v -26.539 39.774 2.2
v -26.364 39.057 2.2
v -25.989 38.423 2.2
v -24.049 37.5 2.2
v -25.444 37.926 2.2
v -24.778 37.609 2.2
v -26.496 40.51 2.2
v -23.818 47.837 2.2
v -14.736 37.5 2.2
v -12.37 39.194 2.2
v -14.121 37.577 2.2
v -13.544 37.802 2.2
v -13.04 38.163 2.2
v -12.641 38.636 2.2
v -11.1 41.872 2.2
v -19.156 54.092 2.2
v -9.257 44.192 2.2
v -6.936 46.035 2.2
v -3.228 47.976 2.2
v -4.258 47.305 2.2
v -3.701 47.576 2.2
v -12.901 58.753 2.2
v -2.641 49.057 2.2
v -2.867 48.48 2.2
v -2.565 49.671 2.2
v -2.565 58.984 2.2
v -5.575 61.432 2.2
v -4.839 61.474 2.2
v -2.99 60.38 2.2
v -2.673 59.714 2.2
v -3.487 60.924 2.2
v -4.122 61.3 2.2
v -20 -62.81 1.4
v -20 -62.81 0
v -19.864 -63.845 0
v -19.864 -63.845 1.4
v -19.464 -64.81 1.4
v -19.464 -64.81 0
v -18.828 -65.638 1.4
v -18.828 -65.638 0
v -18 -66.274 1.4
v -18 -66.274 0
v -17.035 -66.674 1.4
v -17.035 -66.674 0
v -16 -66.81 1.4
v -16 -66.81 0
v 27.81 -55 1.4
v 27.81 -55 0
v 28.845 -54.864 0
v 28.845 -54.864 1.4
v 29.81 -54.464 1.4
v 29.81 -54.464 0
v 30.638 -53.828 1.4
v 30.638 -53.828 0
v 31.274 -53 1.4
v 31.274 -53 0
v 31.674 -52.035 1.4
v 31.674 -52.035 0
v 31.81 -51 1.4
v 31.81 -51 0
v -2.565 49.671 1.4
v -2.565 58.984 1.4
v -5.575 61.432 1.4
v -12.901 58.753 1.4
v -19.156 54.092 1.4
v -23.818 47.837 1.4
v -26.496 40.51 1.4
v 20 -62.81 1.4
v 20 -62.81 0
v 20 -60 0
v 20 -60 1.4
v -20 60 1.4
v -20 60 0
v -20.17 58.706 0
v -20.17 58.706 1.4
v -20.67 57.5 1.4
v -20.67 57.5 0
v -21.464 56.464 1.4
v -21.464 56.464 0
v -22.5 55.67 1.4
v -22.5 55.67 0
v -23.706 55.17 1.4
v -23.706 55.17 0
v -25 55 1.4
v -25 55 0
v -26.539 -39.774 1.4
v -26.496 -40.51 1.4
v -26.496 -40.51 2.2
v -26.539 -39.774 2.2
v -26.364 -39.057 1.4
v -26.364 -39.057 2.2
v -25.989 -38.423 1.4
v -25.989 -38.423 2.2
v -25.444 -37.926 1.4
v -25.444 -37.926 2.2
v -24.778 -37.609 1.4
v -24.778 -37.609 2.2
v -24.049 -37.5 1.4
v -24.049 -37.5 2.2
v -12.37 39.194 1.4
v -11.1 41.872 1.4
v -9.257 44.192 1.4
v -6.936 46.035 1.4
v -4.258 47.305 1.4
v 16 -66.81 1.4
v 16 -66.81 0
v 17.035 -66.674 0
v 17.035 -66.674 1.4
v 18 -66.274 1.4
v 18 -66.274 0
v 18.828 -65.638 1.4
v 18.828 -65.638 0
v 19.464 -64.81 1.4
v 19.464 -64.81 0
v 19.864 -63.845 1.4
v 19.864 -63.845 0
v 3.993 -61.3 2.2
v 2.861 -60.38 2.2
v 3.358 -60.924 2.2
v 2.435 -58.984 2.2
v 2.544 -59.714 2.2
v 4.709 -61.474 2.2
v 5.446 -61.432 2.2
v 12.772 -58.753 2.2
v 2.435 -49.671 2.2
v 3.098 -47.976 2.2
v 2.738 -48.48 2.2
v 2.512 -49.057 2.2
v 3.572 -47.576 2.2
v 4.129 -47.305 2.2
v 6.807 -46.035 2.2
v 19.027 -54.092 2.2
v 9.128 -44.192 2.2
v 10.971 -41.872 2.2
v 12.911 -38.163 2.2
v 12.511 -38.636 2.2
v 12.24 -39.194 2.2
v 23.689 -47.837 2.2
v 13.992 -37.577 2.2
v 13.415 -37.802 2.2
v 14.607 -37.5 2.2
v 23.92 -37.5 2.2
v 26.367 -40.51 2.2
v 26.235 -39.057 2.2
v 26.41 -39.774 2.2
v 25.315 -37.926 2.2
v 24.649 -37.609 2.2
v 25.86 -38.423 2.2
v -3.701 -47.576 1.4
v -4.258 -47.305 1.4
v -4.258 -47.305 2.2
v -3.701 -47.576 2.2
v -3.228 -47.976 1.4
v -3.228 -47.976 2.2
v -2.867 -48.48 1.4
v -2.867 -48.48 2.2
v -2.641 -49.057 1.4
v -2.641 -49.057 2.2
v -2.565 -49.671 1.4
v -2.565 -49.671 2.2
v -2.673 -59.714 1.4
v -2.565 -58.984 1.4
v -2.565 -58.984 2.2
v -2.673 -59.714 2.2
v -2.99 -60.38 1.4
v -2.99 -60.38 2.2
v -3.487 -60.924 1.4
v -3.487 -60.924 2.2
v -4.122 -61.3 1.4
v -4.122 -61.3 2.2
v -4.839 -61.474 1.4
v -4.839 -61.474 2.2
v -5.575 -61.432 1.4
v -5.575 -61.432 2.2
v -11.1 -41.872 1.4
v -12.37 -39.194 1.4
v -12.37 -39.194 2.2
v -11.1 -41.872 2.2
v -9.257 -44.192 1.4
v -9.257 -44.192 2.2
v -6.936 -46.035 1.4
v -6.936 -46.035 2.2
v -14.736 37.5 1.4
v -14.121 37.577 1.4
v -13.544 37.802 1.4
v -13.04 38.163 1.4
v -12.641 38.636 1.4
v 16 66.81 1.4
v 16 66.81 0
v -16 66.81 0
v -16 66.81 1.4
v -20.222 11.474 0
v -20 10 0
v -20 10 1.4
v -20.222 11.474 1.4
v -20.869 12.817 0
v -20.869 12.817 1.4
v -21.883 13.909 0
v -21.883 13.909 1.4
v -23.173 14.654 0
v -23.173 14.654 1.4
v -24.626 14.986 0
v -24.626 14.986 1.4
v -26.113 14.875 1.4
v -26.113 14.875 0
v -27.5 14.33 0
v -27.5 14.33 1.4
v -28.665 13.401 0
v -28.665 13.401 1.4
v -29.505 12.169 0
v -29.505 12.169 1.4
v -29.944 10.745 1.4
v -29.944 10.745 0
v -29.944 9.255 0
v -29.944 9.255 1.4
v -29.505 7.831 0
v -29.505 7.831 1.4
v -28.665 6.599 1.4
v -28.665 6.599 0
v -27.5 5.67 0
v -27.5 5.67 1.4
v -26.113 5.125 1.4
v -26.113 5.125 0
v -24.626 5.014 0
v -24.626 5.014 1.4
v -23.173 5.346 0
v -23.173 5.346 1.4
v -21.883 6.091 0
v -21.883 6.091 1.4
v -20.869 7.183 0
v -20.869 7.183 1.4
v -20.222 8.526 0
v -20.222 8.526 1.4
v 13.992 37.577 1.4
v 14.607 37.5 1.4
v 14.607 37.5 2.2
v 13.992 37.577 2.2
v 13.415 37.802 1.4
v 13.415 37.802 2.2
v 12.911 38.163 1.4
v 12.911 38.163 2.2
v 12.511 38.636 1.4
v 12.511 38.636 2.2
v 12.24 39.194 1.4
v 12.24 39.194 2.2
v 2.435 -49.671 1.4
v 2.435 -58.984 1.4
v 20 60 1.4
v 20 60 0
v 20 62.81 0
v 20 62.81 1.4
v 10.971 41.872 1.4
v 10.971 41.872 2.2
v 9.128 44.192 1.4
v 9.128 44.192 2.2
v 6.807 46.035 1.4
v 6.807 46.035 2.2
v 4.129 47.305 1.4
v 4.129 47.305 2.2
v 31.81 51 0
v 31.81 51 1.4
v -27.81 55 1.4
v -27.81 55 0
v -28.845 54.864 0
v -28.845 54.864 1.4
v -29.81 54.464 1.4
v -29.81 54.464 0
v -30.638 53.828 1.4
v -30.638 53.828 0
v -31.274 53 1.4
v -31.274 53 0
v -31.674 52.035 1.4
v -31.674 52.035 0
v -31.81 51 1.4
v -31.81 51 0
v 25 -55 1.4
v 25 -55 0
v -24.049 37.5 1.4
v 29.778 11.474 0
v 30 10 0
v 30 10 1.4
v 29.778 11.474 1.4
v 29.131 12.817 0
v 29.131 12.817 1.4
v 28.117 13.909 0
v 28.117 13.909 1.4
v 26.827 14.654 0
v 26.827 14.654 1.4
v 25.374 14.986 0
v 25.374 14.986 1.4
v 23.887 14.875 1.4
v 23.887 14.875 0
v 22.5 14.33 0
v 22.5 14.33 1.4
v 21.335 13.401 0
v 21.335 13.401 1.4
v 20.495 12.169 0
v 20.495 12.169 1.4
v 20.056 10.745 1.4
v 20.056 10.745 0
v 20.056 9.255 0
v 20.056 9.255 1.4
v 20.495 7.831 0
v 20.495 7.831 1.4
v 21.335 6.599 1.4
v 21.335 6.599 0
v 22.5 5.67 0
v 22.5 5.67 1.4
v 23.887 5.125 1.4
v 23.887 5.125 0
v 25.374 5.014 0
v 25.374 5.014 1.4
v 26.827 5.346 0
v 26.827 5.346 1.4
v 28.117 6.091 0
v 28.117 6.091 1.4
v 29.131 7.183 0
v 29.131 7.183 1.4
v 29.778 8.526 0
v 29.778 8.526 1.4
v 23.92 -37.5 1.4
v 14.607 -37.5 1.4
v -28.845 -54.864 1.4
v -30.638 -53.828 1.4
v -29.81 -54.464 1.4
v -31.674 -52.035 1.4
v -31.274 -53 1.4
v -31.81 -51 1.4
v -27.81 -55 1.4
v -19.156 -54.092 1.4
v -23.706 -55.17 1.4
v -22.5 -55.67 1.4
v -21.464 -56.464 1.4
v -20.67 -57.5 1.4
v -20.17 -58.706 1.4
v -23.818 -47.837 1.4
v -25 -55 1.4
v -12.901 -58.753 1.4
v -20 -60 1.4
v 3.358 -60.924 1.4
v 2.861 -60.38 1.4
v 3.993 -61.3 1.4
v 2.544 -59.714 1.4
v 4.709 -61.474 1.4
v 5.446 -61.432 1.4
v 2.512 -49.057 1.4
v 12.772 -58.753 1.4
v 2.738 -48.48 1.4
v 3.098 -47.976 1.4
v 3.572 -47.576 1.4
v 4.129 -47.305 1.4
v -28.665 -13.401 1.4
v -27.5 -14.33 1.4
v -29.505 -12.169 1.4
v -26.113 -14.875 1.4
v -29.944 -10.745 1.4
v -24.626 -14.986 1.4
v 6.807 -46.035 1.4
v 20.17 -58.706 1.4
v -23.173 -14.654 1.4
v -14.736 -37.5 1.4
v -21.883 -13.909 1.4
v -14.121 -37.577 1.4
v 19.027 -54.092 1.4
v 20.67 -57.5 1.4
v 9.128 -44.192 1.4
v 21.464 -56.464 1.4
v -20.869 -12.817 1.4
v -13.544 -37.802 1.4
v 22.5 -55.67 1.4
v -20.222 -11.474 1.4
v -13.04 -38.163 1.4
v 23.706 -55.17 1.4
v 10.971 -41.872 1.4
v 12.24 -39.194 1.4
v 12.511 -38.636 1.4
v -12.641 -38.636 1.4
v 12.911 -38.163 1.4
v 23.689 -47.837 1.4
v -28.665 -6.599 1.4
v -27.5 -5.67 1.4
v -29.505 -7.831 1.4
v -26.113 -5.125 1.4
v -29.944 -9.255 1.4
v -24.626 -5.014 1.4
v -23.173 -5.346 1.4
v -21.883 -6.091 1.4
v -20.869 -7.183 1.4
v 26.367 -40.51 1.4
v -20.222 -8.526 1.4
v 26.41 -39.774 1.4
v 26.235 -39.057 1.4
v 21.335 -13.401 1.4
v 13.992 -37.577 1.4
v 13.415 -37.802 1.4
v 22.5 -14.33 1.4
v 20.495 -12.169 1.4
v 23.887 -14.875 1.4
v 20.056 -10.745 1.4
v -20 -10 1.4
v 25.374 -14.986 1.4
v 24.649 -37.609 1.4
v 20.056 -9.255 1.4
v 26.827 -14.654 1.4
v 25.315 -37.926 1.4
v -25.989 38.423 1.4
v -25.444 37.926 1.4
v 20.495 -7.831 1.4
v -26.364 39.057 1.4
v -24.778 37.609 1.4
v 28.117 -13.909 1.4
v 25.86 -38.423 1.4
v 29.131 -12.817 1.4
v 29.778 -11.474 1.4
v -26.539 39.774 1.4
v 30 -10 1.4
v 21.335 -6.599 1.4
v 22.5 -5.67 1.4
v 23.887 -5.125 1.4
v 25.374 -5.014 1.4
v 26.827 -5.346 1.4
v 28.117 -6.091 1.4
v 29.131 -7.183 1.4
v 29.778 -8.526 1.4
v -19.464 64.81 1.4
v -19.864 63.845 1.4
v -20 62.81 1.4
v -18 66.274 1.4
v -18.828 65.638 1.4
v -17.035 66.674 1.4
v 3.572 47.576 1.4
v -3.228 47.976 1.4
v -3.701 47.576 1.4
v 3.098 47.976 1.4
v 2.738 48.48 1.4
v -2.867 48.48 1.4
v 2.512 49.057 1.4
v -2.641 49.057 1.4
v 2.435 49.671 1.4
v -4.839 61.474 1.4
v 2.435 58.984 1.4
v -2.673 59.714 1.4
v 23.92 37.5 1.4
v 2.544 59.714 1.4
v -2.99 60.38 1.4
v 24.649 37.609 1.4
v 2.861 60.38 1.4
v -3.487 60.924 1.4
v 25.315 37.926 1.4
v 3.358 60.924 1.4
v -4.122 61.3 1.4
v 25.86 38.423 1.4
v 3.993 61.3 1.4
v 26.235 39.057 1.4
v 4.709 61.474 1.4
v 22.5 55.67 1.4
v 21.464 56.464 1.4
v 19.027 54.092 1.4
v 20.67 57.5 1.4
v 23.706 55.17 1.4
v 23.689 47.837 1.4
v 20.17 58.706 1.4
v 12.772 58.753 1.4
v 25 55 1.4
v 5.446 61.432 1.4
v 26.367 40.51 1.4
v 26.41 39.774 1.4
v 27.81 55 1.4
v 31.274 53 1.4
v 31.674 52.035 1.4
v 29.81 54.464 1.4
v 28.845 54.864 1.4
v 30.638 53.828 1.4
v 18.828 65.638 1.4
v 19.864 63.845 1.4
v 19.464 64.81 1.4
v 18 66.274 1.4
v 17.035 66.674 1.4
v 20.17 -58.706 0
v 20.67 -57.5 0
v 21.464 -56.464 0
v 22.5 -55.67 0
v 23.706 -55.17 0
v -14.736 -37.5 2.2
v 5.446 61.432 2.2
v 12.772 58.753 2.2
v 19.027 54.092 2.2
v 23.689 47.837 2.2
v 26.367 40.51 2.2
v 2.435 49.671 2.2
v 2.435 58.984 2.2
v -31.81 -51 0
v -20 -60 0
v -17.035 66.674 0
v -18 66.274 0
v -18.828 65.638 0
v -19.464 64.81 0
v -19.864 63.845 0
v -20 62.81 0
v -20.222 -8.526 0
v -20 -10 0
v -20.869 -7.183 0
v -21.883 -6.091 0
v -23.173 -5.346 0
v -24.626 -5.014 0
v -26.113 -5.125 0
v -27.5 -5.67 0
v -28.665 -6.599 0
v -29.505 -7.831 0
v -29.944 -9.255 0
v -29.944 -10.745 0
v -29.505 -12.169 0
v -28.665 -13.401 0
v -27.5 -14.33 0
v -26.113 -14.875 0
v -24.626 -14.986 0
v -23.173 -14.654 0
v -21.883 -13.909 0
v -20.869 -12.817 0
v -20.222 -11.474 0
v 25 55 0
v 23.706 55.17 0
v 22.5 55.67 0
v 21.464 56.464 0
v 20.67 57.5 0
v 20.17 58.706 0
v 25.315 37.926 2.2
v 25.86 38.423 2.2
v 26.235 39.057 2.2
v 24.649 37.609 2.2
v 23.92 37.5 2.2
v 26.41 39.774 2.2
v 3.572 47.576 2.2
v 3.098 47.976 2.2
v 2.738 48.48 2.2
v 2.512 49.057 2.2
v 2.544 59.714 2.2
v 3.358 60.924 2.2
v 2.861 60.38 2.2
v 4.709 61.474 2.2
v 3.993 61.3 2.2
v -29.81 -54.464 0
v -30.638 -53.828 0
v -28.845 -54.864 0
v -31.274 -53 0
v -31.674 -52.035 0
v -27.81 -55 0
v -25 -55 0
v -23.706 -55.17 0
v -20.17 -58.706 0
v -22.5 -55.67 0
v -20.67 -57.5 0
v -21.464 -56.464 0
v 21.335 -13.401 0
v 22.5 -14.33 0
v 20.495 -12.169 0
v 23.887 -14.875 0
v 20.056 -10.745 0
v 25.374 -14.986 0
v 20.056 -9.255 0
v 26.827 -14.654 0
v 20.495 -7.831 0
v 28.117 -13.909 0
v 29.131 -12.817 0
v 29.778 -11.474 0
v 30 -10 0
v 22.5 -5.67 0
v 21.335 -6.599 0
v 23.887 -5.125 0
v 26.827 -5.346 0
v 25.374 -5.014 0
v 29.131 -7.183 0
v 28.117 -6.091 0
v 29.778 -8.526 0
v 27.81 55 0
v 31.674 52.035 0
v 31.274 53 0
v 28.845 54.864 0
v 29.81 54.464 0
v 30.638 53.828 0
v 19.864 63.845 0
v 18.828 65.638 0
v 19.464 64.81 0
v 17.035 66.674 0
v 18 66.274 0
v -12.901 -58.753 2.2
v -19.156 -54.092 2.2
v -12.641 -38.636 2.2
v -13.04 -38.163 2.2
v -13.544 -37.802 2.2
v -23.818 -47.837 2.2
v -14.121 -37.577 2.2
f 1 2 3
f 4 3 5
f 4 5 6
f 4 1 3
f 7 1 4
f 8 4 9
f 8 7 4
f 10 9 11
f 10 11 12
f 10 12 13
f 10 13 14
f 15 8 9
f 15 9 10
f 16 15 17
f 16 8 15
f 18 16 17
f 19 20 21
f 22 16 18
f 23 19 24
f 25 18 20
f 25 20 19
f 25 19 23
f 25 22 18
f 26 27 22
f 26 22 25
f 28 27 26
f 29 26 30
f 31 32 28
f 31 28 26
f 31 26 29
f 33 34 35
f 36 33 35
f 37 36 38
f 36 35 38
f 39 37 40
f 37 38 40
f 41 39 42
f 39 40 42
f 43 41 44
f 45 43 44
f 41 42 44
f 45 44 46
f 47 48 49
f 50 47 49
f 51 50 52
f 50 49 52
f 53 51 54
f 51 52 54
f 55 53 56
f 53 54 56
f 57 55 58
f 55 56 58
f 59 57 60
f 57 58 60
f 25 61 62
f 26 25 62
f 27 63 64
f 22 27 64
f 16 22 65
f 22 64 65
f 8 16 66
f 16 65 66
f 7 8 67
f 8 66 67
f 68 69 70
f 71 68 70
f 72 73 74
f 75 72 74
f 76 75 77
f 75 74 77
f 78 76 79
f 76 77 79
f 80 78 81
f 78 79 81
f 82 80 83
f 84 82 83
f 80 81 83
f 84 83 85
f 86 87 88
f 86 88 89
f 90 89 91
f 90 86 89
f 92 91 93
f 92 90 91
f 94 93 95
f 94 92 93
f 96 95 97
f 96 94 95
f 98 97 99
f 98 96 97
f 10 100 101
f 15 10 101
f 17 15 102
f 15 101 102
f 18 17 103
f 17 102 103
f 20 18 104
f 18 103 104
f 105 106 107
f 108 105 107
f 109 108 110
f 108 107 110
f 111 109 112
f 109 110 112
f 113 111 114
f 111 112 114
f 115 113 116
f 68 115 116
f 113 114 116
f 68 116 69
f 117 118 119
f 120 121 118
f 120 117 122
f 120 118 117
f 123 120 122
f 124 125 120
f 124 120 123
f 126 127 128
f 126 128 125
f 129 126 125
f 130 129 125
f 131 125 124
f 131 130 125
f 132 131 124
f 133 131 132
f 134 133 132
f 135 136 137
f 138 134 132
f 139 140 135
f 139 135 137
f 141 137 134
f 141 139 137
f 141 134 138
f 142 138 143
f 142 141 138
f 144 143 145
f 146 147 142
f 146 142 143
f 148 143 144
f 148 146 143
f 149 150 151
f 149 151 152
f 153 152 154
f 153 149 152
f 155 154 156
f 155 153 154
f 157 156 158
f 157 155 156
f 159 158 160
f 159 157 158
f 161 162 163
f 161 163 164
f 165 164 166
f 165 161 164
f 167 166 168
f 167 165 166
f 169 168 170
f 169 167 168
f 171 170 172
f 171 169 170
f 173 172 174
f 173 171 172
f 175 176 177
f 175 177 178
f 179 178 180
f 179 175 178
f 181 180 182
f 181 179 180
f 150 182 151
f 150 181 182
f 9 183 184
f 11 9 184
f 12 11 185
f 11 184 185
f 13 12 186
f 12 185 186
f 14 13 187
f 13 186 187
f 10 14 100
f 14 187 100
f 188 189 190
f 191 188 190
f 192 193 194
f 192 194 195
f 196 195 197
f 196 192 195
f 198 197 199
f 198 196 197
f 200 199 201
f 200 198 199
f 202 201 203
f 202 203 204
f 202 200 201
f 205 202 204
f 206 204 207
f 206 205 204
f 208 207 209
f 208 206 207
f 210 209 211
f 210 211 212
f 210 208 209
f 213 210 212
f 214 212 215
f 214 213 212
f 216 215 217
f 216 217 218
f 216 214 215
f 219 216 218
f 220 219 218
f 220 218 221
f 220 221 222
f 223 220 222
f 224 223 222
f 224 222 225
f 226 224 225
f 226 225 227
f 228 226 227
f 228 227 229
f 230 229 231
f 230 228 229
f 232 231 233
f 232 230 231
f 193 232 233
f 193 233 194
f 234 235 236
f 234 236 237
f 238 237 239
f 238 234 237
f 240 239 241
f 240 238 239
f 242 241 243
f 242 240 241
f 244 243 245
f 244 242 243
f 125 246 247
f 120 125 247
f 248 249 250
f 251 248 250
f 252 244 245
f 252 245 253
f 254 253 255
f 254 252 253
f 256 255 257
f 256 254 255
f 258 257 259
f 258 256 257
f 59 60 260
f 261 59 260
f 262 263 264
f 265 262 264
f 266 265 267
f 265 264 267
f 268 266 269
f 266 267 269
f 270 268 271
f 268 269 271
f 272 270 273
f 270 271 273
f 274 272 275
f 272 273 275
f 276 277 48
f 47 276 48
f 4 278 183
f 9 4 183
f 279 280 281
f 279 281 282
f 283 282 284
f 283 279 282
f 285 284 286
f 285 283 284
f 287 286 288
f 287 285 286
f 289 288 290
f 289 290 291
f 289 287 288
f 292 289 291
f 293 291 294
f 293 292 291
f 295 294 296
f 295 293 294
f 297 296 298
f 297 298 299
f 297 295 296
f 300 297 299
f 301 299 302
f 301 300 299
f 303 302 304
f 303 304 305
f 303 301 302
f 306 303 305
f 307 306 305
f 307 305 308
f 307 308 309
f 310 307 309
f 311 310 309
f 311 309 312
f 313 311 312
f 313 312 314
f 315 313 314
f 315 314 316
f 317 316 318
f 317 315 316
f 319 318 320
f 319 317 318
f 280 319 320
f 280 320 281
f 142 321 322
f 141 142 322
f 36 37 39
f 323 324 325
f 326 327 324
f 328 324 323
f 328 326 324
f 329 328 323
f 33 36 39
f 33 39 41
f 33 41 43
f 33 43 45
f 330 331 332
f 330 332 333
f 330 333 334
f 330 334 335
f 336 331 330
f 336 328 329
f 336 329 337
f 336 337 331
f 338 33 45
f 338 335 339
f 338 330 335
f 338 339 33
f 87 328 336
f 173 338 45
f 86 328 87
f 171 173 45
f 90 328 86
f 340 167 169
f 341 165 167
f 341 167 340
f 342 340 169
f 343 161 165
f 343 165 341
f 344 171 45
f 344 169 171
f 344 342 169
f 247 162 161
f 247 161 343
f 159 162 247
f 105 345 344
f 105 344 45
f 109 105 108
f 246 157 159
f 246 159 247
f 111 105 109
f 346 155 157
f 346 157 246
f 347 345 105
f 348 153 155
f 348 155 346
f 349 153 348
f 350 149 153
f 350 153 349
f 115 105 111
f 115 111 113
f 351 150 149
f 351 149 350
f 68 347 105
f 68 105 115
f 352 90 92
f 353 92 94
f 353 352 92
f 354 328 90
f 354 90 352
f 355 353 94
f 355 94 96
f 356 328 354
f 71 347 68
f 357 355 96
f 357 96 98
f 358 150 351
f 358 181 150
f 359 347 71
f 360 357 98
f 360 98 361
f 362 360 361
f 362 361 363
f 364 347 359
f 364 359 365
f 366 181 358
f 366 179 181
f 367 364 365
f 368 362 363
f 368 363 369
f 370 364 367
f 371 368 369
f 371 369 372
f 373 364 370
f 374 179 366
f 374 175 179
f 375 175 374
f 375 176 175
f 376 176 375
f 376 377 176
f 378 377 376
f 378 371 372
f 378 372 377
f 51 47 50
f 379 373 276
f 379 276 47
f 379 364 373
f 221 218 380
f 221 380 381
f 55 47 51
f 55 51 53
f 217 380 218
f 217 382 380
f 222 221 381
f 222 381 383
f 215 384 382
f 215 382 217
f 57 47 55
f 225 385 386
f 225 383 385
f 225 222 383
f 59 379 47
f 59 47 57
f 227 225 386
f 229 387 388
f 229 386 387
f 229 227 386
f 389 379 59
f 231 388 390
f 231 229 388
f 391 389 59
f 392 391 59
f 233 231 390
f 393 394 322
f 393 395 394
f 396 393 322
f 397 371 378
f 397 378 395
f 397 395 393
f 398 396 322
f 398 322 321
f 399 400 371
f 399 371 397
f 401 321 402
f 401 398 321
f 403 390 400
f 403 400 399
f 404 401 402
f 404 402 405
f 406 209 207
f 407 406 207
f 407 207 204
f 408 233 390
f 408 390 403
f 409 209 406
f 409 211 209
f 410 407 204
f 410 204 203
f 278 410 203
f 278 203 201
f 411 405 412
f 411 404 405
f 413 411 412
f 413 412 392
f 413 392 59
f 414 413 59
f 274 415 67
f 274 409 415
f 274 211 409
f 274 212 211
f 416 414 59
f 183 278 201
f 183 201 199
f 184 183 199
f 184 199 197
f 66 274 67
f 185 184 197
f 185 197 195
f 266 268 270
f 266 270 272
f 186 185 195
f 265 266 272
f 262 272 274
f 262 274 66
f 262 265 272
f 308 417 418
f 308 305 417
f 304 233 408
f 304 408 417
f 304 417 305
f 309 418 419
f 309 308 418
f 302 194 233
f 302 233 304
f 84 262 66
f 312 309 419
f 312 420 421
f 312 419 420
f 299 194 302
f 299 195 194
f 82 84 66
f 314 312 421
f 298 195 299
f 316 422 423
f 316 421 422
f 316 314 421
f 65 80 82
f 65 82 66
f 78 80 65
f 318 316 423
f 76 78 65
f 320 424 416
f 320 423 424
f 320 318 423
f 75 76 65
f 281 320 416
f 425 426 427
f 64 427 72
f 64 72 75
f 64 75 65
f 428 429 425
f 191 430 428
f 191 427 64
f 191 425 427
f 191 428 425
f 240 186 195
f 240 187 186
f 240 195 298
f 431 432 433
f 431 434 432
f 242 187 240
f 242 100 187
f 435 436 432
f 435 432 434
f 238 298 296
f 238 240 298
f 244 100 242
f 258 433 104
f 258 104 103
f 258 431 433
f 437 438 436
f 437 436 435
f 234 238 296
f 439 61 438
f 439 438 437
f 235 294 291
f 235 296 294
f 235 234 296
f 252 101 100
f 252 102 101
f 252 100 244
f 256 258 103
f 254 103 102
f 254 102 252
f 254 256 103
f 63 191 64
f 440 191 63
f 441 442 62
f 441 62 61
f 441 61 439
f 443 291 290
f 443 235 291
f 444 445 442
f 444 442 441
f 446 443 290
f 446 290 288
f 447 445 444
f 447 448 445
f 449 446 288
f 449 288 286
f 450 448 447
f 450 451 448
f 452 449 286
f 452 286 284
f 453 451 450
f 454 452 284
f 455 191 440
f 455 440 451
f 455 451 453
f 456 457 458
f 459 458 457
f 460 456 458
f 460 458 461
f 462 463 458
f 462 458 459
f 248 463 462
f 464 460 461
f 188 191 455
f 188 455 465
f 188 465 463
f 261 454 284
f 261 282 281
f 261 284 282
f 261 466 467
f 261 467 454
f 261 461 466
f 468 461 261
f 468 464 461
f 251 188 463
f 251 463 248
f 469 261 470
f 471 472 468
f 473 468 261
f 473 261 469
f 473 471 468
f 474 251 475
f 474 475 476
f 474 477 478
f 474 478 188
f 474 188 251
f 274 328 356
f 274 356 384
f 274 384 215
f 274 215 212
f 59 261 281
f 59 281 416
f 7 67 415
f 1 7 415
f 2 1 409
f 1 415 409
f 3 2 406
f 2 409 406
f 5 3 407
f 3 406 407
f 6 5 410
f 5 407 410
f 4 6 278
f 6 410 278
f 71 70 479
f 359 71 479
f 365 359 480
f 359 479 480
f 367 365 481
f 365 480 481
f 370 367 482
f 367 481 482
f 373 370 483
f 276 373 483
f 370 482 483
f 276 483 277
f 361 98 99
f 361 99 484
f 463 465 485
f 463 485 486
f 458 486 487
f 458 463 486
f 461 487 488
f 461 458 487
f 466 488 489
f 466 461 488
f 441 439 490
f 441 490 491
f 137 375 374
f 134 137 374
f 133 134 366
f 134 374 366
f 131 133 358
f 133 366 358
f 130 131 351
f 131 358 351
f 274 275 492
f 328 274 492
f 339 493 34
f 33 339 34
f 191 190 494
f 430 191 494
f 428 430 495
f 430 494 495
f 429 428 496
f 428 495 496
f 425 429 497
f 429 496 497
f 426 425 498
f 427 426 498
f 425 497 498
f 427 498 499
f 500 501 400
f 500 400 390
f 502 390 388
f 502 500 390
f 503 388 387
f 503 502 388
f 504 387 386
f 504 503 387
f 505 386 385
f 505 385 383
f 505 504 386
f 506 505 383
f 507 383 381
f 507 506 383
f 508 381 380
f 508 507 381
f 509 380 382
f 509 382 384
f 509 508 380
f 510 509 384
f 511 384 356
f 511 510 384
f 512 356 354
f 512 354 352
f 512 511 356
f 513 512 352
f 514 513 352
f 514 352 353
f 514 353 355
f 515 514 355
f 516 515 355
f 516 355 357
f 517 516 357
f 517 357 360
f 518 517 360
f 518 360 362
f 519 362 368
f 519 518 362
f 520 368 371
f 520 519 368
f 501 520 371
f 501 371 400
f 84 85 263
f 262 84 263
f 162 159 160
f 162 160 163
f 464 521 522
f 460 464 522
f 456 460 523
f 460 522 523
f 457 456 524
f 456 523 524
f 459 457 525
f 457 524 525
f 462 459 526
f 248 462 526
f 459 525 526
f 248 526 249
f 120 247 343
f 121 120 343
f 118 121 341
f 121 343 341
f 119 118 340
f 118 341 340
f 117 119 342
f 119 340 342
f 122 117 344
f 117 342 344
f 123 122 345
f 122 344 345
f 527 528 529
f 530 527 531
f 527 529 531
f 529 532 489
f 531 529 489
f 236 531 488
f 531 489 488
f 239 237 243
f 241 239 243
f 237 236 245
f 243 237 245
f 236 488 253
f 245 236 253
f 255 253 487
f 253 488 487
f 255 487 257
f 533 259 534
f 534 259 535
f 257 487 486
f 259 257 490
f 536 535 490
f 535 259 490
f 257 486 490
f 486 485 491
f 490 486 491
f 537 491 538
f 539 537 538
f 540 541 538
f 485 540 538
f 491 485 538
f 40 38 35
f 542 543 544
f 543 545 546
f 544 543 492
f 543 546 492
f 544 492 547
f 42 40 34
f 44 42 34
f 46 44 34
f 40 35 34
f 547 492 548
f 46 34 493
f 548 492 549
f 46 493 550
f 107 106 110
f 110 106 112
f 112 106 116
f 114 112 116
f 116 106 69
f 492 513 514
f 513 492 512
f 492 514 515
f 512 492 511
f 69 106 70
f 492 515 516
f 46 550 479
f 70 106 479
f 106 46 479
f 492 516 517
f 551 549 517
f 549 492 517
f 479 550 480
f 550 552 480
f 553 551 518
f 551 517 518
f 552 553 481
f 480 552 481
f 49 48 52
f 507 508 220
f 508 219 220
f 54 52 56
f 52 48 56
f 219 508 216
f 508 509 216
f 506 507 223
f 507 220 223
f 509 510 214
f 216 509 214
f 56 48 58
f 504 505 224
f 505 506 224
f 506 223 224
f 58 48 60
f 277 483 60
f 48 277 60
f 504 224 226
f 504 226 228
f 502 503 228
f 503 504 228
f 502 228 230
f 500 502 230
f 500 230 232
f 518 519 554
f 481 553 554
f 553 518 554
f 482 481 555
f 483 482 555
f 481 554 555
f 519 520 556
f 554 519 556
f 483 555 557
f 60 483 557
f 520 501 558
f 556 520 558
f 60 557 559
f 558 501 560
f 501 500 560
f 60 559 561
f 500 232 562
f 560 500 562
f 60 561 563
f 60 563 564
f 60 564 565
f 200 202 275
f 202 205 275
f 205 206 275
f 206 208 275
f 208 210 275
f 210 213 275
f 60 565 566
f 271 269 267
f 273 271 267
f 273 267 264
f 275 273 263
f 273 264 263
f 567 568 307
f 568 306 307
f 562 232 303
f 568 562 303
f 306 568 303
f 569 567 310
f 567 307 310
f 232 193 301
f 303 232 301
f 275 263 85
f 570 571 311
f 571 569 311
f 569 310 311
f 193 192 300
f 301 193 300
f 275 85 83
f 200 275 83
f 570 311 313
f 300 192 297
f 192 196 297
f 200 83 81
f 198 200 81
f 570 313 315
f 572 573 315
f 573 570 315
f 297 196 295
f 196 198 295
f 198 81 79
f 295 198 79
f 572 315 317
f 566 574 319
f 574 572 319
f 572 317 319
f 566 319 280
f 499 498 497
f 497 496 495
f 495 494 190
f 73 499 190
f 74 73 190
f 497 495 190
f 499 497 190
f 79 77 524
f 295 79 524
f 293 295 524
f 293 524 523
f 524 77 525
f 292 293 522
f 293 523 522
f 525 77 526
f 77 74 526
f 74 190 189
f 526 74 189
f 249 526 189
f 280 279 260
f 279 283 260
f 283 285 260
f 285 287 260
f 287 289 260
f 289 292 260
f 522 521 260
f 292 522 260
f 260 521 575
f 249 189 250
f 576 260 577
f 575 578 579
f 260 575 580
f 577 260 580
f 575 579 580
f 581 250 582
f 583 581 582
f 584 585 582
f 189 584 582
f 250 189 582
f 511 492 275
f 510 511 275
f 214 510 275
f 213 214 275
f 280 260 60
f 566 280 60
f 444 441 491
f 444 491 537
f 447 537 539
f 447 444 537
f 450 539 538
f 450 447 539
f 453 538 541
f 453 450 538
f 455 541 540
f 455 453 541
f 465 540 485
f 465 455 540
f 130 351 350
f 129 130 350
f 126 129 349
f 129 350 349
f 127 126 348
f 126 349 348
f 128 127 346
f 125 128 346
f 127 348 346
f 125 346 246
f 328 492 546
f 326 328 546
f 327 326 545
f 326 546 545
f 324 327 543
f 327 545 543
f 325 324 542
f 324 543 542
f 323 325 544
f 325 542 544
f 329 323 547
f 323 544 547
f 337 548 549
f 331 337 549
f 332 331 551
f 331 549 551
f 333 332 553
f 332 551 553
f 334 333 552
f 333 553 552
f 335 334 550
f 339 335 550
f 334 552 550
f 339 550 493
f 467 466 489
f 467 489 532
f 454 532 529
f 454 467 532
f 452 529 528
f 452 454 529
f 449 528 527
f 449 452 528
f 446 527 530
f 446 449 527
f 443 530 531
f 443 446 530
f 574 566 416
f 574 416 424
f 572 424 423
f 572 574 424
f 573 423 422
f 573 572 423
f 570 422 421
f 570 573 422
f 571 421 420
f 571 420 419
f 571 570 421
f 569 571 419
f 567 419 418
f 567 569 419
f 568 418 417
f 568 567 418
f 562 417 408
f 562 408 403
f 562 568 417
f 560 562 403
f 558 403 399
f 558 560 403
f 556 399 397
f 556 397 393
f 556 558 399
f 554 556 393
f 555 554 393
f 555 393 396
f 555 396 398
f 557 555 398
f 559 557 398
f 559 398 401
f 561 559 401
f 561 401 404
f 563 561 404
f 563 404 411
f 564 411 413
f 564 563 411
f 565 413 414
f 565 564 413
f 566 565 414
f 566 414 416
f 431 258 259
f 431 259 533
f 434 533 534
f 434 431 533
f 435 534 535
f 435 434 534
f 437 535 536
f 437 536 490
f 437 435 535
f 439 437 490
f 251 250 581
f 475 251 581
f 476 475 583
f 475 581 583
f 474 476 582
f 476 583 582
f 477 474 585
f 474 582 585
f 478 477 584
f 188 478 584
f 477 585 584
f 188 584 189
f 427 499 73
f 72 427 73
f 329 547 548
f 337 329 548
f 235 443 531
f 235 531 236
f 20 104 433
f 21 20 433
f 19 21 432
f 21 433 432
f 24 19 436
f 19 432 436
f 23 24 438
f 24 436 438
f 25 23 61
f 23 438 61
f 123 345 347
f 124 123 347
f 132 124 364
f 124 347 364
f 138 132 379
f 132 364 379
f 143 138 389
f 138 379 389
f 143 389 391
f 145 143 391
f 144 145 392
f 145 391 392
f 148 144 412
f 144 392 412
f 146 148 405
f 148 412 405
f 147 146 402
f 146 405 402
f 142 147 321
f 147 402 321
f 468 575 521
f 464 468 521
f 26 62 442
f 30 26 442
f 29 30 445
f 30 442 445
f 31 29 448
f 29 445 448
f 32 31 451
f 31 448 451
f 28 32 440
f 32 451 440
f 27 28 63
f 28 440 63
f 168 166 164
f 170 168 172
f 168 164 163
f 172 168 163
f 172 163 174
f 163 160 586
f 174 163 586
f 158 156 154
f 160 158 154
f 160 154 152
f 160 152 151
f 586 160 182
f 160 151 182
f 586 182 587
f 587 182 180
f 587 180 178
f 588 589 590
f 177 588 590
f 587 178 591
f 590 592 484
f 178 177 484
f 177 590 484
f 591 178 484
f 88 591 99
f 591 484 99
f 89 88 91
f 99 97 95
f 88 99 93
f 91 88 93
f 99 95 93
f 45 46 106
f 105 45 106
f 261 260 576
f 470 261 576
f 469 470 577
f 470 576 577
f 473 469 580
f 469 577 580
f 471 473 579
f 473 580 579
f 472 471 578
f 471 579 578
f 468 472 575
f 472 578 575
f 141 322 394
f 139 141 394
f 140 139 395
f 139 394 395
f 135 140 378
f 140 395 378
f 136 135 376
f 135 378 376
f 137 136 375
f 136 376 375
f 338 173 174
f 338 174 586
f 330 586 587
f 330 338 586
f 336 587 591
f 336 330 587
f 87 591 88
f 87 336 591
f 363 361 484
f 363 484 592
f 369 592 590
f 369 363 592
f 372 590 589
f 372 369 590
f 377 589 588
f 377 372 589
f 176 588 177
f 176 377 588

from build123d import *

# Parameters (mm, degrees)
SKETCH1_R           = 5
BOSS_EXTRUDE1_DEPTH = 1.4
BOSS_EXTRUDE2_DEPTH = 0.8


with BuildPart() as part:
    # Sketch1 → Boss-Extrude1 (new body)
    with BuildSketch(Plane.XY):
        with BuildLine():
            Line((20, 60), (20, 62.81))
            ThreePointArc((20, 62.81), (18.828427125, 65.638427125), (16, 66.81))
            Line((16, 66.81), (-16, 66.81))
            ThreePointArc((-16, 66.81), (-18.828427125, 65.638427125), (-20, 62.81))
            Line((-20, 62.81), (-20, 60))
            ThreePointArc((-20, 60), (-21.464466094, 56.464466094), (-25, 55))
            Line((-25, 55), (-27.81, 55))
            ThreePointArc((-27.81, 55), (-30.638427125, 53.828427125), (-31.81, 51))
            Line((-31.81, 51), (-31.81, -51))
            ThreePointArc((-31.81, -51), (-30.638427125, -53.828427125), (-27.81, -55))
            Line((-27.81, -55), (-25, -55))
            ThreePointArc((-25, -55), (-21.464466094, -56.464466094), (-20, -60))
            Line((-20, -60), (-20, -62.81))
            ThreePointArc((-20, -62.81), (-18.828427125, -65.638427125), (-16, -66.81))
            Line((-16, -66.81), (16, -66.81))
            ThreePointArc((16, -66.81), (18.828427125, -65.638427125), (20, -62.81))
            Line((20, -62.81), (20, -60))
            ThreePointArc((20, -60), (21.464466094, -56.464466094), (25, -55))
            Line((25, -55), (27.81, -55))
            ThreePointArc((27.81, -55), (30.638427125, -53.828427125), (31.81, -51))
            Line((31.81, -51), (31.81, 51))
            ThreePointArc((31.81, 51), (30.638427125, 53.828427125), (27.81, 55))
            Line((27.81, 55), (25, 55))
            ThreePointArc((25, 55), (21.464466094, 56.464466094), (20, 60))
        make_face()
        with Locations((-25, 10)):
            Circle(SKETCH1_R, mode=Mode.SUBTRACT)
        with Locations((25, 10)):
            Circle(SKETCH1_R, mode=Mode.SUBTRACT)
        with Locations((-25, -10)):
            Circle(SKETCH1_R, mode=Mode.SUBTRACT)
        with Locations((25, -10)):
            Circle(SKETCH1_R, mode=Mode.SUBTRACT)
    extrude(amount=BOSS_EXTRUDE1_DEPTH)

    # Sketch2 → Boss-Extrude2 (add)
    with BuildSketch(Plane.XY.offset(1.4)):
        with BuildLine():
            Line((-24.048951294, 37.5), (-14.735982135, 37.5))
            ThreePointArc((-14.735982135, 37.5), (-13.281012897, 37.967006022), (-12.369627175, 39.193548387))
            ThreePointArc((-12.369627175, 39.193548387), (-9.256969539, 44.192388155), (-4.258129771, 47.305045791))
            ThreePointArc((-4.258129771, 47.305045791), (-3.031587405, 48.216431513), (-2.564581384, 49.671400751))
            Line((-2.564581384, 49.671400751), (-2.564581384, 58.98436991))
            ThreePointArc((-2.564581384, 58.98436991), (-3.487481229, 60.924152141), (-5.574785465, 61.431754595))
            ThreePointArc((-5.574785465, 61.431754595), (-19.156464476, 54.091883092), (-26.496335979, 40.510204082))
            ThreePointArc((-26.496335979, 40.510204082), (-25.988733525, 38.422899845), (-24.048951294, 37.5))
        make_face()
        with BuildLine():
            Line((23.919788527, 37.5), (14.606819368, 37.5))
            ThreePointArc((14.606819368, 37.5), (13.151850129, 37.967006022), (12.240464408, 39.193548387))
            ThreePointArc((12.240464408, 39.193548387), (9.127806772, 44.192388155), (4.128967004, 47.305045791))
            ThreePointArc((4.128967004, 47.305045791), (2.902424638, 48.216431513), (2.435418616, 49.671400751))
            Line((2.435418616, 49.671400751), (2.435418616, 58.98436991))
            ThreePointArc((2.435418616, 58.98436991), (3.358318462, 60.924152141), (5.445622698, 61.431754595))
            ThreePointArc((5.445622698, 61.431754595), (19.027301709, 54.091883092), (26.367173212, 40.510204082))
            ThreePointArc((26.367173212, 40.510204082), (25.859570757, 38.422899845), (23.919788527, 37.5))
        make_face()
        with BuildLine():
            Line((-24.048951294, -37.5), (-14.735982135, -37.5))
            ThreePointArc((-14.735982135, -37.5), (-13.281012897, -37.967006022), (-12.369627175, -39.193548387))
            ThreePointArc((-12.369627175, -39.193548387), (-9.256969539, -44.192388155), (-4.258129771, -47.305045791))
            ThreePointArc((-4.258129771, -47.305045791), (-3.031587405, -48.216431513), (-2.564581384, -49.671400751))
            Line((-2.564581384, -49.671400751), (-2.564581384, -58.98436991))
            ThreePointArc((-2.564581384, -58.98436991), (-3.487481229, -60.924152141), (-5.574785465, -61.431754595))
            ThreePointArc((-5.574785465, -61.431754595), (-19.156464476, -54.091883092), (-26.496335979, -40.510204082))
            ThreePointArc((-26.496335979, -40.510204082), (-25.988733525, -38.422899845), (-24.048951294, -37.5))
        make_face()
        with BuildLine():
            Line((2.435418616, -49.671400751), (2.435418616, -58.98436991))
            ThreePointArc((2.435418616, -58.98436991), (3.358318462, -60.924152141), (5.445622698, -61.431754595))
            ThreePointArc((5.445622698, -61.431754595), (19.027301709, -54.091883092), (26.367173212, -40.510204082))
            ThreePointArc((26.367173212, -40.510204082), (25.859570757, -38.422899845), (23.919788527, -37.5))
            Line((23.919788527, -37.5), (14.606819368, -37.5))
            ThreePointArc((14.606819368, -37.5), (13.151850129, -37.967006022), (12.240464408, -39.193548387))
            ThreePointArc((12.240464408, -39.193548387), (9.127806772, -44.192388155), (4.128967004, -47.305045791))
            ThreePointArc((4.128967004, -47.305045791), (2.902424638, -48.216431513), (2.435418616, -49.671400751))
        make_face()
    extrude(amount=BOSS_EXTRUDE2_DEPTH)


solid = part.part
